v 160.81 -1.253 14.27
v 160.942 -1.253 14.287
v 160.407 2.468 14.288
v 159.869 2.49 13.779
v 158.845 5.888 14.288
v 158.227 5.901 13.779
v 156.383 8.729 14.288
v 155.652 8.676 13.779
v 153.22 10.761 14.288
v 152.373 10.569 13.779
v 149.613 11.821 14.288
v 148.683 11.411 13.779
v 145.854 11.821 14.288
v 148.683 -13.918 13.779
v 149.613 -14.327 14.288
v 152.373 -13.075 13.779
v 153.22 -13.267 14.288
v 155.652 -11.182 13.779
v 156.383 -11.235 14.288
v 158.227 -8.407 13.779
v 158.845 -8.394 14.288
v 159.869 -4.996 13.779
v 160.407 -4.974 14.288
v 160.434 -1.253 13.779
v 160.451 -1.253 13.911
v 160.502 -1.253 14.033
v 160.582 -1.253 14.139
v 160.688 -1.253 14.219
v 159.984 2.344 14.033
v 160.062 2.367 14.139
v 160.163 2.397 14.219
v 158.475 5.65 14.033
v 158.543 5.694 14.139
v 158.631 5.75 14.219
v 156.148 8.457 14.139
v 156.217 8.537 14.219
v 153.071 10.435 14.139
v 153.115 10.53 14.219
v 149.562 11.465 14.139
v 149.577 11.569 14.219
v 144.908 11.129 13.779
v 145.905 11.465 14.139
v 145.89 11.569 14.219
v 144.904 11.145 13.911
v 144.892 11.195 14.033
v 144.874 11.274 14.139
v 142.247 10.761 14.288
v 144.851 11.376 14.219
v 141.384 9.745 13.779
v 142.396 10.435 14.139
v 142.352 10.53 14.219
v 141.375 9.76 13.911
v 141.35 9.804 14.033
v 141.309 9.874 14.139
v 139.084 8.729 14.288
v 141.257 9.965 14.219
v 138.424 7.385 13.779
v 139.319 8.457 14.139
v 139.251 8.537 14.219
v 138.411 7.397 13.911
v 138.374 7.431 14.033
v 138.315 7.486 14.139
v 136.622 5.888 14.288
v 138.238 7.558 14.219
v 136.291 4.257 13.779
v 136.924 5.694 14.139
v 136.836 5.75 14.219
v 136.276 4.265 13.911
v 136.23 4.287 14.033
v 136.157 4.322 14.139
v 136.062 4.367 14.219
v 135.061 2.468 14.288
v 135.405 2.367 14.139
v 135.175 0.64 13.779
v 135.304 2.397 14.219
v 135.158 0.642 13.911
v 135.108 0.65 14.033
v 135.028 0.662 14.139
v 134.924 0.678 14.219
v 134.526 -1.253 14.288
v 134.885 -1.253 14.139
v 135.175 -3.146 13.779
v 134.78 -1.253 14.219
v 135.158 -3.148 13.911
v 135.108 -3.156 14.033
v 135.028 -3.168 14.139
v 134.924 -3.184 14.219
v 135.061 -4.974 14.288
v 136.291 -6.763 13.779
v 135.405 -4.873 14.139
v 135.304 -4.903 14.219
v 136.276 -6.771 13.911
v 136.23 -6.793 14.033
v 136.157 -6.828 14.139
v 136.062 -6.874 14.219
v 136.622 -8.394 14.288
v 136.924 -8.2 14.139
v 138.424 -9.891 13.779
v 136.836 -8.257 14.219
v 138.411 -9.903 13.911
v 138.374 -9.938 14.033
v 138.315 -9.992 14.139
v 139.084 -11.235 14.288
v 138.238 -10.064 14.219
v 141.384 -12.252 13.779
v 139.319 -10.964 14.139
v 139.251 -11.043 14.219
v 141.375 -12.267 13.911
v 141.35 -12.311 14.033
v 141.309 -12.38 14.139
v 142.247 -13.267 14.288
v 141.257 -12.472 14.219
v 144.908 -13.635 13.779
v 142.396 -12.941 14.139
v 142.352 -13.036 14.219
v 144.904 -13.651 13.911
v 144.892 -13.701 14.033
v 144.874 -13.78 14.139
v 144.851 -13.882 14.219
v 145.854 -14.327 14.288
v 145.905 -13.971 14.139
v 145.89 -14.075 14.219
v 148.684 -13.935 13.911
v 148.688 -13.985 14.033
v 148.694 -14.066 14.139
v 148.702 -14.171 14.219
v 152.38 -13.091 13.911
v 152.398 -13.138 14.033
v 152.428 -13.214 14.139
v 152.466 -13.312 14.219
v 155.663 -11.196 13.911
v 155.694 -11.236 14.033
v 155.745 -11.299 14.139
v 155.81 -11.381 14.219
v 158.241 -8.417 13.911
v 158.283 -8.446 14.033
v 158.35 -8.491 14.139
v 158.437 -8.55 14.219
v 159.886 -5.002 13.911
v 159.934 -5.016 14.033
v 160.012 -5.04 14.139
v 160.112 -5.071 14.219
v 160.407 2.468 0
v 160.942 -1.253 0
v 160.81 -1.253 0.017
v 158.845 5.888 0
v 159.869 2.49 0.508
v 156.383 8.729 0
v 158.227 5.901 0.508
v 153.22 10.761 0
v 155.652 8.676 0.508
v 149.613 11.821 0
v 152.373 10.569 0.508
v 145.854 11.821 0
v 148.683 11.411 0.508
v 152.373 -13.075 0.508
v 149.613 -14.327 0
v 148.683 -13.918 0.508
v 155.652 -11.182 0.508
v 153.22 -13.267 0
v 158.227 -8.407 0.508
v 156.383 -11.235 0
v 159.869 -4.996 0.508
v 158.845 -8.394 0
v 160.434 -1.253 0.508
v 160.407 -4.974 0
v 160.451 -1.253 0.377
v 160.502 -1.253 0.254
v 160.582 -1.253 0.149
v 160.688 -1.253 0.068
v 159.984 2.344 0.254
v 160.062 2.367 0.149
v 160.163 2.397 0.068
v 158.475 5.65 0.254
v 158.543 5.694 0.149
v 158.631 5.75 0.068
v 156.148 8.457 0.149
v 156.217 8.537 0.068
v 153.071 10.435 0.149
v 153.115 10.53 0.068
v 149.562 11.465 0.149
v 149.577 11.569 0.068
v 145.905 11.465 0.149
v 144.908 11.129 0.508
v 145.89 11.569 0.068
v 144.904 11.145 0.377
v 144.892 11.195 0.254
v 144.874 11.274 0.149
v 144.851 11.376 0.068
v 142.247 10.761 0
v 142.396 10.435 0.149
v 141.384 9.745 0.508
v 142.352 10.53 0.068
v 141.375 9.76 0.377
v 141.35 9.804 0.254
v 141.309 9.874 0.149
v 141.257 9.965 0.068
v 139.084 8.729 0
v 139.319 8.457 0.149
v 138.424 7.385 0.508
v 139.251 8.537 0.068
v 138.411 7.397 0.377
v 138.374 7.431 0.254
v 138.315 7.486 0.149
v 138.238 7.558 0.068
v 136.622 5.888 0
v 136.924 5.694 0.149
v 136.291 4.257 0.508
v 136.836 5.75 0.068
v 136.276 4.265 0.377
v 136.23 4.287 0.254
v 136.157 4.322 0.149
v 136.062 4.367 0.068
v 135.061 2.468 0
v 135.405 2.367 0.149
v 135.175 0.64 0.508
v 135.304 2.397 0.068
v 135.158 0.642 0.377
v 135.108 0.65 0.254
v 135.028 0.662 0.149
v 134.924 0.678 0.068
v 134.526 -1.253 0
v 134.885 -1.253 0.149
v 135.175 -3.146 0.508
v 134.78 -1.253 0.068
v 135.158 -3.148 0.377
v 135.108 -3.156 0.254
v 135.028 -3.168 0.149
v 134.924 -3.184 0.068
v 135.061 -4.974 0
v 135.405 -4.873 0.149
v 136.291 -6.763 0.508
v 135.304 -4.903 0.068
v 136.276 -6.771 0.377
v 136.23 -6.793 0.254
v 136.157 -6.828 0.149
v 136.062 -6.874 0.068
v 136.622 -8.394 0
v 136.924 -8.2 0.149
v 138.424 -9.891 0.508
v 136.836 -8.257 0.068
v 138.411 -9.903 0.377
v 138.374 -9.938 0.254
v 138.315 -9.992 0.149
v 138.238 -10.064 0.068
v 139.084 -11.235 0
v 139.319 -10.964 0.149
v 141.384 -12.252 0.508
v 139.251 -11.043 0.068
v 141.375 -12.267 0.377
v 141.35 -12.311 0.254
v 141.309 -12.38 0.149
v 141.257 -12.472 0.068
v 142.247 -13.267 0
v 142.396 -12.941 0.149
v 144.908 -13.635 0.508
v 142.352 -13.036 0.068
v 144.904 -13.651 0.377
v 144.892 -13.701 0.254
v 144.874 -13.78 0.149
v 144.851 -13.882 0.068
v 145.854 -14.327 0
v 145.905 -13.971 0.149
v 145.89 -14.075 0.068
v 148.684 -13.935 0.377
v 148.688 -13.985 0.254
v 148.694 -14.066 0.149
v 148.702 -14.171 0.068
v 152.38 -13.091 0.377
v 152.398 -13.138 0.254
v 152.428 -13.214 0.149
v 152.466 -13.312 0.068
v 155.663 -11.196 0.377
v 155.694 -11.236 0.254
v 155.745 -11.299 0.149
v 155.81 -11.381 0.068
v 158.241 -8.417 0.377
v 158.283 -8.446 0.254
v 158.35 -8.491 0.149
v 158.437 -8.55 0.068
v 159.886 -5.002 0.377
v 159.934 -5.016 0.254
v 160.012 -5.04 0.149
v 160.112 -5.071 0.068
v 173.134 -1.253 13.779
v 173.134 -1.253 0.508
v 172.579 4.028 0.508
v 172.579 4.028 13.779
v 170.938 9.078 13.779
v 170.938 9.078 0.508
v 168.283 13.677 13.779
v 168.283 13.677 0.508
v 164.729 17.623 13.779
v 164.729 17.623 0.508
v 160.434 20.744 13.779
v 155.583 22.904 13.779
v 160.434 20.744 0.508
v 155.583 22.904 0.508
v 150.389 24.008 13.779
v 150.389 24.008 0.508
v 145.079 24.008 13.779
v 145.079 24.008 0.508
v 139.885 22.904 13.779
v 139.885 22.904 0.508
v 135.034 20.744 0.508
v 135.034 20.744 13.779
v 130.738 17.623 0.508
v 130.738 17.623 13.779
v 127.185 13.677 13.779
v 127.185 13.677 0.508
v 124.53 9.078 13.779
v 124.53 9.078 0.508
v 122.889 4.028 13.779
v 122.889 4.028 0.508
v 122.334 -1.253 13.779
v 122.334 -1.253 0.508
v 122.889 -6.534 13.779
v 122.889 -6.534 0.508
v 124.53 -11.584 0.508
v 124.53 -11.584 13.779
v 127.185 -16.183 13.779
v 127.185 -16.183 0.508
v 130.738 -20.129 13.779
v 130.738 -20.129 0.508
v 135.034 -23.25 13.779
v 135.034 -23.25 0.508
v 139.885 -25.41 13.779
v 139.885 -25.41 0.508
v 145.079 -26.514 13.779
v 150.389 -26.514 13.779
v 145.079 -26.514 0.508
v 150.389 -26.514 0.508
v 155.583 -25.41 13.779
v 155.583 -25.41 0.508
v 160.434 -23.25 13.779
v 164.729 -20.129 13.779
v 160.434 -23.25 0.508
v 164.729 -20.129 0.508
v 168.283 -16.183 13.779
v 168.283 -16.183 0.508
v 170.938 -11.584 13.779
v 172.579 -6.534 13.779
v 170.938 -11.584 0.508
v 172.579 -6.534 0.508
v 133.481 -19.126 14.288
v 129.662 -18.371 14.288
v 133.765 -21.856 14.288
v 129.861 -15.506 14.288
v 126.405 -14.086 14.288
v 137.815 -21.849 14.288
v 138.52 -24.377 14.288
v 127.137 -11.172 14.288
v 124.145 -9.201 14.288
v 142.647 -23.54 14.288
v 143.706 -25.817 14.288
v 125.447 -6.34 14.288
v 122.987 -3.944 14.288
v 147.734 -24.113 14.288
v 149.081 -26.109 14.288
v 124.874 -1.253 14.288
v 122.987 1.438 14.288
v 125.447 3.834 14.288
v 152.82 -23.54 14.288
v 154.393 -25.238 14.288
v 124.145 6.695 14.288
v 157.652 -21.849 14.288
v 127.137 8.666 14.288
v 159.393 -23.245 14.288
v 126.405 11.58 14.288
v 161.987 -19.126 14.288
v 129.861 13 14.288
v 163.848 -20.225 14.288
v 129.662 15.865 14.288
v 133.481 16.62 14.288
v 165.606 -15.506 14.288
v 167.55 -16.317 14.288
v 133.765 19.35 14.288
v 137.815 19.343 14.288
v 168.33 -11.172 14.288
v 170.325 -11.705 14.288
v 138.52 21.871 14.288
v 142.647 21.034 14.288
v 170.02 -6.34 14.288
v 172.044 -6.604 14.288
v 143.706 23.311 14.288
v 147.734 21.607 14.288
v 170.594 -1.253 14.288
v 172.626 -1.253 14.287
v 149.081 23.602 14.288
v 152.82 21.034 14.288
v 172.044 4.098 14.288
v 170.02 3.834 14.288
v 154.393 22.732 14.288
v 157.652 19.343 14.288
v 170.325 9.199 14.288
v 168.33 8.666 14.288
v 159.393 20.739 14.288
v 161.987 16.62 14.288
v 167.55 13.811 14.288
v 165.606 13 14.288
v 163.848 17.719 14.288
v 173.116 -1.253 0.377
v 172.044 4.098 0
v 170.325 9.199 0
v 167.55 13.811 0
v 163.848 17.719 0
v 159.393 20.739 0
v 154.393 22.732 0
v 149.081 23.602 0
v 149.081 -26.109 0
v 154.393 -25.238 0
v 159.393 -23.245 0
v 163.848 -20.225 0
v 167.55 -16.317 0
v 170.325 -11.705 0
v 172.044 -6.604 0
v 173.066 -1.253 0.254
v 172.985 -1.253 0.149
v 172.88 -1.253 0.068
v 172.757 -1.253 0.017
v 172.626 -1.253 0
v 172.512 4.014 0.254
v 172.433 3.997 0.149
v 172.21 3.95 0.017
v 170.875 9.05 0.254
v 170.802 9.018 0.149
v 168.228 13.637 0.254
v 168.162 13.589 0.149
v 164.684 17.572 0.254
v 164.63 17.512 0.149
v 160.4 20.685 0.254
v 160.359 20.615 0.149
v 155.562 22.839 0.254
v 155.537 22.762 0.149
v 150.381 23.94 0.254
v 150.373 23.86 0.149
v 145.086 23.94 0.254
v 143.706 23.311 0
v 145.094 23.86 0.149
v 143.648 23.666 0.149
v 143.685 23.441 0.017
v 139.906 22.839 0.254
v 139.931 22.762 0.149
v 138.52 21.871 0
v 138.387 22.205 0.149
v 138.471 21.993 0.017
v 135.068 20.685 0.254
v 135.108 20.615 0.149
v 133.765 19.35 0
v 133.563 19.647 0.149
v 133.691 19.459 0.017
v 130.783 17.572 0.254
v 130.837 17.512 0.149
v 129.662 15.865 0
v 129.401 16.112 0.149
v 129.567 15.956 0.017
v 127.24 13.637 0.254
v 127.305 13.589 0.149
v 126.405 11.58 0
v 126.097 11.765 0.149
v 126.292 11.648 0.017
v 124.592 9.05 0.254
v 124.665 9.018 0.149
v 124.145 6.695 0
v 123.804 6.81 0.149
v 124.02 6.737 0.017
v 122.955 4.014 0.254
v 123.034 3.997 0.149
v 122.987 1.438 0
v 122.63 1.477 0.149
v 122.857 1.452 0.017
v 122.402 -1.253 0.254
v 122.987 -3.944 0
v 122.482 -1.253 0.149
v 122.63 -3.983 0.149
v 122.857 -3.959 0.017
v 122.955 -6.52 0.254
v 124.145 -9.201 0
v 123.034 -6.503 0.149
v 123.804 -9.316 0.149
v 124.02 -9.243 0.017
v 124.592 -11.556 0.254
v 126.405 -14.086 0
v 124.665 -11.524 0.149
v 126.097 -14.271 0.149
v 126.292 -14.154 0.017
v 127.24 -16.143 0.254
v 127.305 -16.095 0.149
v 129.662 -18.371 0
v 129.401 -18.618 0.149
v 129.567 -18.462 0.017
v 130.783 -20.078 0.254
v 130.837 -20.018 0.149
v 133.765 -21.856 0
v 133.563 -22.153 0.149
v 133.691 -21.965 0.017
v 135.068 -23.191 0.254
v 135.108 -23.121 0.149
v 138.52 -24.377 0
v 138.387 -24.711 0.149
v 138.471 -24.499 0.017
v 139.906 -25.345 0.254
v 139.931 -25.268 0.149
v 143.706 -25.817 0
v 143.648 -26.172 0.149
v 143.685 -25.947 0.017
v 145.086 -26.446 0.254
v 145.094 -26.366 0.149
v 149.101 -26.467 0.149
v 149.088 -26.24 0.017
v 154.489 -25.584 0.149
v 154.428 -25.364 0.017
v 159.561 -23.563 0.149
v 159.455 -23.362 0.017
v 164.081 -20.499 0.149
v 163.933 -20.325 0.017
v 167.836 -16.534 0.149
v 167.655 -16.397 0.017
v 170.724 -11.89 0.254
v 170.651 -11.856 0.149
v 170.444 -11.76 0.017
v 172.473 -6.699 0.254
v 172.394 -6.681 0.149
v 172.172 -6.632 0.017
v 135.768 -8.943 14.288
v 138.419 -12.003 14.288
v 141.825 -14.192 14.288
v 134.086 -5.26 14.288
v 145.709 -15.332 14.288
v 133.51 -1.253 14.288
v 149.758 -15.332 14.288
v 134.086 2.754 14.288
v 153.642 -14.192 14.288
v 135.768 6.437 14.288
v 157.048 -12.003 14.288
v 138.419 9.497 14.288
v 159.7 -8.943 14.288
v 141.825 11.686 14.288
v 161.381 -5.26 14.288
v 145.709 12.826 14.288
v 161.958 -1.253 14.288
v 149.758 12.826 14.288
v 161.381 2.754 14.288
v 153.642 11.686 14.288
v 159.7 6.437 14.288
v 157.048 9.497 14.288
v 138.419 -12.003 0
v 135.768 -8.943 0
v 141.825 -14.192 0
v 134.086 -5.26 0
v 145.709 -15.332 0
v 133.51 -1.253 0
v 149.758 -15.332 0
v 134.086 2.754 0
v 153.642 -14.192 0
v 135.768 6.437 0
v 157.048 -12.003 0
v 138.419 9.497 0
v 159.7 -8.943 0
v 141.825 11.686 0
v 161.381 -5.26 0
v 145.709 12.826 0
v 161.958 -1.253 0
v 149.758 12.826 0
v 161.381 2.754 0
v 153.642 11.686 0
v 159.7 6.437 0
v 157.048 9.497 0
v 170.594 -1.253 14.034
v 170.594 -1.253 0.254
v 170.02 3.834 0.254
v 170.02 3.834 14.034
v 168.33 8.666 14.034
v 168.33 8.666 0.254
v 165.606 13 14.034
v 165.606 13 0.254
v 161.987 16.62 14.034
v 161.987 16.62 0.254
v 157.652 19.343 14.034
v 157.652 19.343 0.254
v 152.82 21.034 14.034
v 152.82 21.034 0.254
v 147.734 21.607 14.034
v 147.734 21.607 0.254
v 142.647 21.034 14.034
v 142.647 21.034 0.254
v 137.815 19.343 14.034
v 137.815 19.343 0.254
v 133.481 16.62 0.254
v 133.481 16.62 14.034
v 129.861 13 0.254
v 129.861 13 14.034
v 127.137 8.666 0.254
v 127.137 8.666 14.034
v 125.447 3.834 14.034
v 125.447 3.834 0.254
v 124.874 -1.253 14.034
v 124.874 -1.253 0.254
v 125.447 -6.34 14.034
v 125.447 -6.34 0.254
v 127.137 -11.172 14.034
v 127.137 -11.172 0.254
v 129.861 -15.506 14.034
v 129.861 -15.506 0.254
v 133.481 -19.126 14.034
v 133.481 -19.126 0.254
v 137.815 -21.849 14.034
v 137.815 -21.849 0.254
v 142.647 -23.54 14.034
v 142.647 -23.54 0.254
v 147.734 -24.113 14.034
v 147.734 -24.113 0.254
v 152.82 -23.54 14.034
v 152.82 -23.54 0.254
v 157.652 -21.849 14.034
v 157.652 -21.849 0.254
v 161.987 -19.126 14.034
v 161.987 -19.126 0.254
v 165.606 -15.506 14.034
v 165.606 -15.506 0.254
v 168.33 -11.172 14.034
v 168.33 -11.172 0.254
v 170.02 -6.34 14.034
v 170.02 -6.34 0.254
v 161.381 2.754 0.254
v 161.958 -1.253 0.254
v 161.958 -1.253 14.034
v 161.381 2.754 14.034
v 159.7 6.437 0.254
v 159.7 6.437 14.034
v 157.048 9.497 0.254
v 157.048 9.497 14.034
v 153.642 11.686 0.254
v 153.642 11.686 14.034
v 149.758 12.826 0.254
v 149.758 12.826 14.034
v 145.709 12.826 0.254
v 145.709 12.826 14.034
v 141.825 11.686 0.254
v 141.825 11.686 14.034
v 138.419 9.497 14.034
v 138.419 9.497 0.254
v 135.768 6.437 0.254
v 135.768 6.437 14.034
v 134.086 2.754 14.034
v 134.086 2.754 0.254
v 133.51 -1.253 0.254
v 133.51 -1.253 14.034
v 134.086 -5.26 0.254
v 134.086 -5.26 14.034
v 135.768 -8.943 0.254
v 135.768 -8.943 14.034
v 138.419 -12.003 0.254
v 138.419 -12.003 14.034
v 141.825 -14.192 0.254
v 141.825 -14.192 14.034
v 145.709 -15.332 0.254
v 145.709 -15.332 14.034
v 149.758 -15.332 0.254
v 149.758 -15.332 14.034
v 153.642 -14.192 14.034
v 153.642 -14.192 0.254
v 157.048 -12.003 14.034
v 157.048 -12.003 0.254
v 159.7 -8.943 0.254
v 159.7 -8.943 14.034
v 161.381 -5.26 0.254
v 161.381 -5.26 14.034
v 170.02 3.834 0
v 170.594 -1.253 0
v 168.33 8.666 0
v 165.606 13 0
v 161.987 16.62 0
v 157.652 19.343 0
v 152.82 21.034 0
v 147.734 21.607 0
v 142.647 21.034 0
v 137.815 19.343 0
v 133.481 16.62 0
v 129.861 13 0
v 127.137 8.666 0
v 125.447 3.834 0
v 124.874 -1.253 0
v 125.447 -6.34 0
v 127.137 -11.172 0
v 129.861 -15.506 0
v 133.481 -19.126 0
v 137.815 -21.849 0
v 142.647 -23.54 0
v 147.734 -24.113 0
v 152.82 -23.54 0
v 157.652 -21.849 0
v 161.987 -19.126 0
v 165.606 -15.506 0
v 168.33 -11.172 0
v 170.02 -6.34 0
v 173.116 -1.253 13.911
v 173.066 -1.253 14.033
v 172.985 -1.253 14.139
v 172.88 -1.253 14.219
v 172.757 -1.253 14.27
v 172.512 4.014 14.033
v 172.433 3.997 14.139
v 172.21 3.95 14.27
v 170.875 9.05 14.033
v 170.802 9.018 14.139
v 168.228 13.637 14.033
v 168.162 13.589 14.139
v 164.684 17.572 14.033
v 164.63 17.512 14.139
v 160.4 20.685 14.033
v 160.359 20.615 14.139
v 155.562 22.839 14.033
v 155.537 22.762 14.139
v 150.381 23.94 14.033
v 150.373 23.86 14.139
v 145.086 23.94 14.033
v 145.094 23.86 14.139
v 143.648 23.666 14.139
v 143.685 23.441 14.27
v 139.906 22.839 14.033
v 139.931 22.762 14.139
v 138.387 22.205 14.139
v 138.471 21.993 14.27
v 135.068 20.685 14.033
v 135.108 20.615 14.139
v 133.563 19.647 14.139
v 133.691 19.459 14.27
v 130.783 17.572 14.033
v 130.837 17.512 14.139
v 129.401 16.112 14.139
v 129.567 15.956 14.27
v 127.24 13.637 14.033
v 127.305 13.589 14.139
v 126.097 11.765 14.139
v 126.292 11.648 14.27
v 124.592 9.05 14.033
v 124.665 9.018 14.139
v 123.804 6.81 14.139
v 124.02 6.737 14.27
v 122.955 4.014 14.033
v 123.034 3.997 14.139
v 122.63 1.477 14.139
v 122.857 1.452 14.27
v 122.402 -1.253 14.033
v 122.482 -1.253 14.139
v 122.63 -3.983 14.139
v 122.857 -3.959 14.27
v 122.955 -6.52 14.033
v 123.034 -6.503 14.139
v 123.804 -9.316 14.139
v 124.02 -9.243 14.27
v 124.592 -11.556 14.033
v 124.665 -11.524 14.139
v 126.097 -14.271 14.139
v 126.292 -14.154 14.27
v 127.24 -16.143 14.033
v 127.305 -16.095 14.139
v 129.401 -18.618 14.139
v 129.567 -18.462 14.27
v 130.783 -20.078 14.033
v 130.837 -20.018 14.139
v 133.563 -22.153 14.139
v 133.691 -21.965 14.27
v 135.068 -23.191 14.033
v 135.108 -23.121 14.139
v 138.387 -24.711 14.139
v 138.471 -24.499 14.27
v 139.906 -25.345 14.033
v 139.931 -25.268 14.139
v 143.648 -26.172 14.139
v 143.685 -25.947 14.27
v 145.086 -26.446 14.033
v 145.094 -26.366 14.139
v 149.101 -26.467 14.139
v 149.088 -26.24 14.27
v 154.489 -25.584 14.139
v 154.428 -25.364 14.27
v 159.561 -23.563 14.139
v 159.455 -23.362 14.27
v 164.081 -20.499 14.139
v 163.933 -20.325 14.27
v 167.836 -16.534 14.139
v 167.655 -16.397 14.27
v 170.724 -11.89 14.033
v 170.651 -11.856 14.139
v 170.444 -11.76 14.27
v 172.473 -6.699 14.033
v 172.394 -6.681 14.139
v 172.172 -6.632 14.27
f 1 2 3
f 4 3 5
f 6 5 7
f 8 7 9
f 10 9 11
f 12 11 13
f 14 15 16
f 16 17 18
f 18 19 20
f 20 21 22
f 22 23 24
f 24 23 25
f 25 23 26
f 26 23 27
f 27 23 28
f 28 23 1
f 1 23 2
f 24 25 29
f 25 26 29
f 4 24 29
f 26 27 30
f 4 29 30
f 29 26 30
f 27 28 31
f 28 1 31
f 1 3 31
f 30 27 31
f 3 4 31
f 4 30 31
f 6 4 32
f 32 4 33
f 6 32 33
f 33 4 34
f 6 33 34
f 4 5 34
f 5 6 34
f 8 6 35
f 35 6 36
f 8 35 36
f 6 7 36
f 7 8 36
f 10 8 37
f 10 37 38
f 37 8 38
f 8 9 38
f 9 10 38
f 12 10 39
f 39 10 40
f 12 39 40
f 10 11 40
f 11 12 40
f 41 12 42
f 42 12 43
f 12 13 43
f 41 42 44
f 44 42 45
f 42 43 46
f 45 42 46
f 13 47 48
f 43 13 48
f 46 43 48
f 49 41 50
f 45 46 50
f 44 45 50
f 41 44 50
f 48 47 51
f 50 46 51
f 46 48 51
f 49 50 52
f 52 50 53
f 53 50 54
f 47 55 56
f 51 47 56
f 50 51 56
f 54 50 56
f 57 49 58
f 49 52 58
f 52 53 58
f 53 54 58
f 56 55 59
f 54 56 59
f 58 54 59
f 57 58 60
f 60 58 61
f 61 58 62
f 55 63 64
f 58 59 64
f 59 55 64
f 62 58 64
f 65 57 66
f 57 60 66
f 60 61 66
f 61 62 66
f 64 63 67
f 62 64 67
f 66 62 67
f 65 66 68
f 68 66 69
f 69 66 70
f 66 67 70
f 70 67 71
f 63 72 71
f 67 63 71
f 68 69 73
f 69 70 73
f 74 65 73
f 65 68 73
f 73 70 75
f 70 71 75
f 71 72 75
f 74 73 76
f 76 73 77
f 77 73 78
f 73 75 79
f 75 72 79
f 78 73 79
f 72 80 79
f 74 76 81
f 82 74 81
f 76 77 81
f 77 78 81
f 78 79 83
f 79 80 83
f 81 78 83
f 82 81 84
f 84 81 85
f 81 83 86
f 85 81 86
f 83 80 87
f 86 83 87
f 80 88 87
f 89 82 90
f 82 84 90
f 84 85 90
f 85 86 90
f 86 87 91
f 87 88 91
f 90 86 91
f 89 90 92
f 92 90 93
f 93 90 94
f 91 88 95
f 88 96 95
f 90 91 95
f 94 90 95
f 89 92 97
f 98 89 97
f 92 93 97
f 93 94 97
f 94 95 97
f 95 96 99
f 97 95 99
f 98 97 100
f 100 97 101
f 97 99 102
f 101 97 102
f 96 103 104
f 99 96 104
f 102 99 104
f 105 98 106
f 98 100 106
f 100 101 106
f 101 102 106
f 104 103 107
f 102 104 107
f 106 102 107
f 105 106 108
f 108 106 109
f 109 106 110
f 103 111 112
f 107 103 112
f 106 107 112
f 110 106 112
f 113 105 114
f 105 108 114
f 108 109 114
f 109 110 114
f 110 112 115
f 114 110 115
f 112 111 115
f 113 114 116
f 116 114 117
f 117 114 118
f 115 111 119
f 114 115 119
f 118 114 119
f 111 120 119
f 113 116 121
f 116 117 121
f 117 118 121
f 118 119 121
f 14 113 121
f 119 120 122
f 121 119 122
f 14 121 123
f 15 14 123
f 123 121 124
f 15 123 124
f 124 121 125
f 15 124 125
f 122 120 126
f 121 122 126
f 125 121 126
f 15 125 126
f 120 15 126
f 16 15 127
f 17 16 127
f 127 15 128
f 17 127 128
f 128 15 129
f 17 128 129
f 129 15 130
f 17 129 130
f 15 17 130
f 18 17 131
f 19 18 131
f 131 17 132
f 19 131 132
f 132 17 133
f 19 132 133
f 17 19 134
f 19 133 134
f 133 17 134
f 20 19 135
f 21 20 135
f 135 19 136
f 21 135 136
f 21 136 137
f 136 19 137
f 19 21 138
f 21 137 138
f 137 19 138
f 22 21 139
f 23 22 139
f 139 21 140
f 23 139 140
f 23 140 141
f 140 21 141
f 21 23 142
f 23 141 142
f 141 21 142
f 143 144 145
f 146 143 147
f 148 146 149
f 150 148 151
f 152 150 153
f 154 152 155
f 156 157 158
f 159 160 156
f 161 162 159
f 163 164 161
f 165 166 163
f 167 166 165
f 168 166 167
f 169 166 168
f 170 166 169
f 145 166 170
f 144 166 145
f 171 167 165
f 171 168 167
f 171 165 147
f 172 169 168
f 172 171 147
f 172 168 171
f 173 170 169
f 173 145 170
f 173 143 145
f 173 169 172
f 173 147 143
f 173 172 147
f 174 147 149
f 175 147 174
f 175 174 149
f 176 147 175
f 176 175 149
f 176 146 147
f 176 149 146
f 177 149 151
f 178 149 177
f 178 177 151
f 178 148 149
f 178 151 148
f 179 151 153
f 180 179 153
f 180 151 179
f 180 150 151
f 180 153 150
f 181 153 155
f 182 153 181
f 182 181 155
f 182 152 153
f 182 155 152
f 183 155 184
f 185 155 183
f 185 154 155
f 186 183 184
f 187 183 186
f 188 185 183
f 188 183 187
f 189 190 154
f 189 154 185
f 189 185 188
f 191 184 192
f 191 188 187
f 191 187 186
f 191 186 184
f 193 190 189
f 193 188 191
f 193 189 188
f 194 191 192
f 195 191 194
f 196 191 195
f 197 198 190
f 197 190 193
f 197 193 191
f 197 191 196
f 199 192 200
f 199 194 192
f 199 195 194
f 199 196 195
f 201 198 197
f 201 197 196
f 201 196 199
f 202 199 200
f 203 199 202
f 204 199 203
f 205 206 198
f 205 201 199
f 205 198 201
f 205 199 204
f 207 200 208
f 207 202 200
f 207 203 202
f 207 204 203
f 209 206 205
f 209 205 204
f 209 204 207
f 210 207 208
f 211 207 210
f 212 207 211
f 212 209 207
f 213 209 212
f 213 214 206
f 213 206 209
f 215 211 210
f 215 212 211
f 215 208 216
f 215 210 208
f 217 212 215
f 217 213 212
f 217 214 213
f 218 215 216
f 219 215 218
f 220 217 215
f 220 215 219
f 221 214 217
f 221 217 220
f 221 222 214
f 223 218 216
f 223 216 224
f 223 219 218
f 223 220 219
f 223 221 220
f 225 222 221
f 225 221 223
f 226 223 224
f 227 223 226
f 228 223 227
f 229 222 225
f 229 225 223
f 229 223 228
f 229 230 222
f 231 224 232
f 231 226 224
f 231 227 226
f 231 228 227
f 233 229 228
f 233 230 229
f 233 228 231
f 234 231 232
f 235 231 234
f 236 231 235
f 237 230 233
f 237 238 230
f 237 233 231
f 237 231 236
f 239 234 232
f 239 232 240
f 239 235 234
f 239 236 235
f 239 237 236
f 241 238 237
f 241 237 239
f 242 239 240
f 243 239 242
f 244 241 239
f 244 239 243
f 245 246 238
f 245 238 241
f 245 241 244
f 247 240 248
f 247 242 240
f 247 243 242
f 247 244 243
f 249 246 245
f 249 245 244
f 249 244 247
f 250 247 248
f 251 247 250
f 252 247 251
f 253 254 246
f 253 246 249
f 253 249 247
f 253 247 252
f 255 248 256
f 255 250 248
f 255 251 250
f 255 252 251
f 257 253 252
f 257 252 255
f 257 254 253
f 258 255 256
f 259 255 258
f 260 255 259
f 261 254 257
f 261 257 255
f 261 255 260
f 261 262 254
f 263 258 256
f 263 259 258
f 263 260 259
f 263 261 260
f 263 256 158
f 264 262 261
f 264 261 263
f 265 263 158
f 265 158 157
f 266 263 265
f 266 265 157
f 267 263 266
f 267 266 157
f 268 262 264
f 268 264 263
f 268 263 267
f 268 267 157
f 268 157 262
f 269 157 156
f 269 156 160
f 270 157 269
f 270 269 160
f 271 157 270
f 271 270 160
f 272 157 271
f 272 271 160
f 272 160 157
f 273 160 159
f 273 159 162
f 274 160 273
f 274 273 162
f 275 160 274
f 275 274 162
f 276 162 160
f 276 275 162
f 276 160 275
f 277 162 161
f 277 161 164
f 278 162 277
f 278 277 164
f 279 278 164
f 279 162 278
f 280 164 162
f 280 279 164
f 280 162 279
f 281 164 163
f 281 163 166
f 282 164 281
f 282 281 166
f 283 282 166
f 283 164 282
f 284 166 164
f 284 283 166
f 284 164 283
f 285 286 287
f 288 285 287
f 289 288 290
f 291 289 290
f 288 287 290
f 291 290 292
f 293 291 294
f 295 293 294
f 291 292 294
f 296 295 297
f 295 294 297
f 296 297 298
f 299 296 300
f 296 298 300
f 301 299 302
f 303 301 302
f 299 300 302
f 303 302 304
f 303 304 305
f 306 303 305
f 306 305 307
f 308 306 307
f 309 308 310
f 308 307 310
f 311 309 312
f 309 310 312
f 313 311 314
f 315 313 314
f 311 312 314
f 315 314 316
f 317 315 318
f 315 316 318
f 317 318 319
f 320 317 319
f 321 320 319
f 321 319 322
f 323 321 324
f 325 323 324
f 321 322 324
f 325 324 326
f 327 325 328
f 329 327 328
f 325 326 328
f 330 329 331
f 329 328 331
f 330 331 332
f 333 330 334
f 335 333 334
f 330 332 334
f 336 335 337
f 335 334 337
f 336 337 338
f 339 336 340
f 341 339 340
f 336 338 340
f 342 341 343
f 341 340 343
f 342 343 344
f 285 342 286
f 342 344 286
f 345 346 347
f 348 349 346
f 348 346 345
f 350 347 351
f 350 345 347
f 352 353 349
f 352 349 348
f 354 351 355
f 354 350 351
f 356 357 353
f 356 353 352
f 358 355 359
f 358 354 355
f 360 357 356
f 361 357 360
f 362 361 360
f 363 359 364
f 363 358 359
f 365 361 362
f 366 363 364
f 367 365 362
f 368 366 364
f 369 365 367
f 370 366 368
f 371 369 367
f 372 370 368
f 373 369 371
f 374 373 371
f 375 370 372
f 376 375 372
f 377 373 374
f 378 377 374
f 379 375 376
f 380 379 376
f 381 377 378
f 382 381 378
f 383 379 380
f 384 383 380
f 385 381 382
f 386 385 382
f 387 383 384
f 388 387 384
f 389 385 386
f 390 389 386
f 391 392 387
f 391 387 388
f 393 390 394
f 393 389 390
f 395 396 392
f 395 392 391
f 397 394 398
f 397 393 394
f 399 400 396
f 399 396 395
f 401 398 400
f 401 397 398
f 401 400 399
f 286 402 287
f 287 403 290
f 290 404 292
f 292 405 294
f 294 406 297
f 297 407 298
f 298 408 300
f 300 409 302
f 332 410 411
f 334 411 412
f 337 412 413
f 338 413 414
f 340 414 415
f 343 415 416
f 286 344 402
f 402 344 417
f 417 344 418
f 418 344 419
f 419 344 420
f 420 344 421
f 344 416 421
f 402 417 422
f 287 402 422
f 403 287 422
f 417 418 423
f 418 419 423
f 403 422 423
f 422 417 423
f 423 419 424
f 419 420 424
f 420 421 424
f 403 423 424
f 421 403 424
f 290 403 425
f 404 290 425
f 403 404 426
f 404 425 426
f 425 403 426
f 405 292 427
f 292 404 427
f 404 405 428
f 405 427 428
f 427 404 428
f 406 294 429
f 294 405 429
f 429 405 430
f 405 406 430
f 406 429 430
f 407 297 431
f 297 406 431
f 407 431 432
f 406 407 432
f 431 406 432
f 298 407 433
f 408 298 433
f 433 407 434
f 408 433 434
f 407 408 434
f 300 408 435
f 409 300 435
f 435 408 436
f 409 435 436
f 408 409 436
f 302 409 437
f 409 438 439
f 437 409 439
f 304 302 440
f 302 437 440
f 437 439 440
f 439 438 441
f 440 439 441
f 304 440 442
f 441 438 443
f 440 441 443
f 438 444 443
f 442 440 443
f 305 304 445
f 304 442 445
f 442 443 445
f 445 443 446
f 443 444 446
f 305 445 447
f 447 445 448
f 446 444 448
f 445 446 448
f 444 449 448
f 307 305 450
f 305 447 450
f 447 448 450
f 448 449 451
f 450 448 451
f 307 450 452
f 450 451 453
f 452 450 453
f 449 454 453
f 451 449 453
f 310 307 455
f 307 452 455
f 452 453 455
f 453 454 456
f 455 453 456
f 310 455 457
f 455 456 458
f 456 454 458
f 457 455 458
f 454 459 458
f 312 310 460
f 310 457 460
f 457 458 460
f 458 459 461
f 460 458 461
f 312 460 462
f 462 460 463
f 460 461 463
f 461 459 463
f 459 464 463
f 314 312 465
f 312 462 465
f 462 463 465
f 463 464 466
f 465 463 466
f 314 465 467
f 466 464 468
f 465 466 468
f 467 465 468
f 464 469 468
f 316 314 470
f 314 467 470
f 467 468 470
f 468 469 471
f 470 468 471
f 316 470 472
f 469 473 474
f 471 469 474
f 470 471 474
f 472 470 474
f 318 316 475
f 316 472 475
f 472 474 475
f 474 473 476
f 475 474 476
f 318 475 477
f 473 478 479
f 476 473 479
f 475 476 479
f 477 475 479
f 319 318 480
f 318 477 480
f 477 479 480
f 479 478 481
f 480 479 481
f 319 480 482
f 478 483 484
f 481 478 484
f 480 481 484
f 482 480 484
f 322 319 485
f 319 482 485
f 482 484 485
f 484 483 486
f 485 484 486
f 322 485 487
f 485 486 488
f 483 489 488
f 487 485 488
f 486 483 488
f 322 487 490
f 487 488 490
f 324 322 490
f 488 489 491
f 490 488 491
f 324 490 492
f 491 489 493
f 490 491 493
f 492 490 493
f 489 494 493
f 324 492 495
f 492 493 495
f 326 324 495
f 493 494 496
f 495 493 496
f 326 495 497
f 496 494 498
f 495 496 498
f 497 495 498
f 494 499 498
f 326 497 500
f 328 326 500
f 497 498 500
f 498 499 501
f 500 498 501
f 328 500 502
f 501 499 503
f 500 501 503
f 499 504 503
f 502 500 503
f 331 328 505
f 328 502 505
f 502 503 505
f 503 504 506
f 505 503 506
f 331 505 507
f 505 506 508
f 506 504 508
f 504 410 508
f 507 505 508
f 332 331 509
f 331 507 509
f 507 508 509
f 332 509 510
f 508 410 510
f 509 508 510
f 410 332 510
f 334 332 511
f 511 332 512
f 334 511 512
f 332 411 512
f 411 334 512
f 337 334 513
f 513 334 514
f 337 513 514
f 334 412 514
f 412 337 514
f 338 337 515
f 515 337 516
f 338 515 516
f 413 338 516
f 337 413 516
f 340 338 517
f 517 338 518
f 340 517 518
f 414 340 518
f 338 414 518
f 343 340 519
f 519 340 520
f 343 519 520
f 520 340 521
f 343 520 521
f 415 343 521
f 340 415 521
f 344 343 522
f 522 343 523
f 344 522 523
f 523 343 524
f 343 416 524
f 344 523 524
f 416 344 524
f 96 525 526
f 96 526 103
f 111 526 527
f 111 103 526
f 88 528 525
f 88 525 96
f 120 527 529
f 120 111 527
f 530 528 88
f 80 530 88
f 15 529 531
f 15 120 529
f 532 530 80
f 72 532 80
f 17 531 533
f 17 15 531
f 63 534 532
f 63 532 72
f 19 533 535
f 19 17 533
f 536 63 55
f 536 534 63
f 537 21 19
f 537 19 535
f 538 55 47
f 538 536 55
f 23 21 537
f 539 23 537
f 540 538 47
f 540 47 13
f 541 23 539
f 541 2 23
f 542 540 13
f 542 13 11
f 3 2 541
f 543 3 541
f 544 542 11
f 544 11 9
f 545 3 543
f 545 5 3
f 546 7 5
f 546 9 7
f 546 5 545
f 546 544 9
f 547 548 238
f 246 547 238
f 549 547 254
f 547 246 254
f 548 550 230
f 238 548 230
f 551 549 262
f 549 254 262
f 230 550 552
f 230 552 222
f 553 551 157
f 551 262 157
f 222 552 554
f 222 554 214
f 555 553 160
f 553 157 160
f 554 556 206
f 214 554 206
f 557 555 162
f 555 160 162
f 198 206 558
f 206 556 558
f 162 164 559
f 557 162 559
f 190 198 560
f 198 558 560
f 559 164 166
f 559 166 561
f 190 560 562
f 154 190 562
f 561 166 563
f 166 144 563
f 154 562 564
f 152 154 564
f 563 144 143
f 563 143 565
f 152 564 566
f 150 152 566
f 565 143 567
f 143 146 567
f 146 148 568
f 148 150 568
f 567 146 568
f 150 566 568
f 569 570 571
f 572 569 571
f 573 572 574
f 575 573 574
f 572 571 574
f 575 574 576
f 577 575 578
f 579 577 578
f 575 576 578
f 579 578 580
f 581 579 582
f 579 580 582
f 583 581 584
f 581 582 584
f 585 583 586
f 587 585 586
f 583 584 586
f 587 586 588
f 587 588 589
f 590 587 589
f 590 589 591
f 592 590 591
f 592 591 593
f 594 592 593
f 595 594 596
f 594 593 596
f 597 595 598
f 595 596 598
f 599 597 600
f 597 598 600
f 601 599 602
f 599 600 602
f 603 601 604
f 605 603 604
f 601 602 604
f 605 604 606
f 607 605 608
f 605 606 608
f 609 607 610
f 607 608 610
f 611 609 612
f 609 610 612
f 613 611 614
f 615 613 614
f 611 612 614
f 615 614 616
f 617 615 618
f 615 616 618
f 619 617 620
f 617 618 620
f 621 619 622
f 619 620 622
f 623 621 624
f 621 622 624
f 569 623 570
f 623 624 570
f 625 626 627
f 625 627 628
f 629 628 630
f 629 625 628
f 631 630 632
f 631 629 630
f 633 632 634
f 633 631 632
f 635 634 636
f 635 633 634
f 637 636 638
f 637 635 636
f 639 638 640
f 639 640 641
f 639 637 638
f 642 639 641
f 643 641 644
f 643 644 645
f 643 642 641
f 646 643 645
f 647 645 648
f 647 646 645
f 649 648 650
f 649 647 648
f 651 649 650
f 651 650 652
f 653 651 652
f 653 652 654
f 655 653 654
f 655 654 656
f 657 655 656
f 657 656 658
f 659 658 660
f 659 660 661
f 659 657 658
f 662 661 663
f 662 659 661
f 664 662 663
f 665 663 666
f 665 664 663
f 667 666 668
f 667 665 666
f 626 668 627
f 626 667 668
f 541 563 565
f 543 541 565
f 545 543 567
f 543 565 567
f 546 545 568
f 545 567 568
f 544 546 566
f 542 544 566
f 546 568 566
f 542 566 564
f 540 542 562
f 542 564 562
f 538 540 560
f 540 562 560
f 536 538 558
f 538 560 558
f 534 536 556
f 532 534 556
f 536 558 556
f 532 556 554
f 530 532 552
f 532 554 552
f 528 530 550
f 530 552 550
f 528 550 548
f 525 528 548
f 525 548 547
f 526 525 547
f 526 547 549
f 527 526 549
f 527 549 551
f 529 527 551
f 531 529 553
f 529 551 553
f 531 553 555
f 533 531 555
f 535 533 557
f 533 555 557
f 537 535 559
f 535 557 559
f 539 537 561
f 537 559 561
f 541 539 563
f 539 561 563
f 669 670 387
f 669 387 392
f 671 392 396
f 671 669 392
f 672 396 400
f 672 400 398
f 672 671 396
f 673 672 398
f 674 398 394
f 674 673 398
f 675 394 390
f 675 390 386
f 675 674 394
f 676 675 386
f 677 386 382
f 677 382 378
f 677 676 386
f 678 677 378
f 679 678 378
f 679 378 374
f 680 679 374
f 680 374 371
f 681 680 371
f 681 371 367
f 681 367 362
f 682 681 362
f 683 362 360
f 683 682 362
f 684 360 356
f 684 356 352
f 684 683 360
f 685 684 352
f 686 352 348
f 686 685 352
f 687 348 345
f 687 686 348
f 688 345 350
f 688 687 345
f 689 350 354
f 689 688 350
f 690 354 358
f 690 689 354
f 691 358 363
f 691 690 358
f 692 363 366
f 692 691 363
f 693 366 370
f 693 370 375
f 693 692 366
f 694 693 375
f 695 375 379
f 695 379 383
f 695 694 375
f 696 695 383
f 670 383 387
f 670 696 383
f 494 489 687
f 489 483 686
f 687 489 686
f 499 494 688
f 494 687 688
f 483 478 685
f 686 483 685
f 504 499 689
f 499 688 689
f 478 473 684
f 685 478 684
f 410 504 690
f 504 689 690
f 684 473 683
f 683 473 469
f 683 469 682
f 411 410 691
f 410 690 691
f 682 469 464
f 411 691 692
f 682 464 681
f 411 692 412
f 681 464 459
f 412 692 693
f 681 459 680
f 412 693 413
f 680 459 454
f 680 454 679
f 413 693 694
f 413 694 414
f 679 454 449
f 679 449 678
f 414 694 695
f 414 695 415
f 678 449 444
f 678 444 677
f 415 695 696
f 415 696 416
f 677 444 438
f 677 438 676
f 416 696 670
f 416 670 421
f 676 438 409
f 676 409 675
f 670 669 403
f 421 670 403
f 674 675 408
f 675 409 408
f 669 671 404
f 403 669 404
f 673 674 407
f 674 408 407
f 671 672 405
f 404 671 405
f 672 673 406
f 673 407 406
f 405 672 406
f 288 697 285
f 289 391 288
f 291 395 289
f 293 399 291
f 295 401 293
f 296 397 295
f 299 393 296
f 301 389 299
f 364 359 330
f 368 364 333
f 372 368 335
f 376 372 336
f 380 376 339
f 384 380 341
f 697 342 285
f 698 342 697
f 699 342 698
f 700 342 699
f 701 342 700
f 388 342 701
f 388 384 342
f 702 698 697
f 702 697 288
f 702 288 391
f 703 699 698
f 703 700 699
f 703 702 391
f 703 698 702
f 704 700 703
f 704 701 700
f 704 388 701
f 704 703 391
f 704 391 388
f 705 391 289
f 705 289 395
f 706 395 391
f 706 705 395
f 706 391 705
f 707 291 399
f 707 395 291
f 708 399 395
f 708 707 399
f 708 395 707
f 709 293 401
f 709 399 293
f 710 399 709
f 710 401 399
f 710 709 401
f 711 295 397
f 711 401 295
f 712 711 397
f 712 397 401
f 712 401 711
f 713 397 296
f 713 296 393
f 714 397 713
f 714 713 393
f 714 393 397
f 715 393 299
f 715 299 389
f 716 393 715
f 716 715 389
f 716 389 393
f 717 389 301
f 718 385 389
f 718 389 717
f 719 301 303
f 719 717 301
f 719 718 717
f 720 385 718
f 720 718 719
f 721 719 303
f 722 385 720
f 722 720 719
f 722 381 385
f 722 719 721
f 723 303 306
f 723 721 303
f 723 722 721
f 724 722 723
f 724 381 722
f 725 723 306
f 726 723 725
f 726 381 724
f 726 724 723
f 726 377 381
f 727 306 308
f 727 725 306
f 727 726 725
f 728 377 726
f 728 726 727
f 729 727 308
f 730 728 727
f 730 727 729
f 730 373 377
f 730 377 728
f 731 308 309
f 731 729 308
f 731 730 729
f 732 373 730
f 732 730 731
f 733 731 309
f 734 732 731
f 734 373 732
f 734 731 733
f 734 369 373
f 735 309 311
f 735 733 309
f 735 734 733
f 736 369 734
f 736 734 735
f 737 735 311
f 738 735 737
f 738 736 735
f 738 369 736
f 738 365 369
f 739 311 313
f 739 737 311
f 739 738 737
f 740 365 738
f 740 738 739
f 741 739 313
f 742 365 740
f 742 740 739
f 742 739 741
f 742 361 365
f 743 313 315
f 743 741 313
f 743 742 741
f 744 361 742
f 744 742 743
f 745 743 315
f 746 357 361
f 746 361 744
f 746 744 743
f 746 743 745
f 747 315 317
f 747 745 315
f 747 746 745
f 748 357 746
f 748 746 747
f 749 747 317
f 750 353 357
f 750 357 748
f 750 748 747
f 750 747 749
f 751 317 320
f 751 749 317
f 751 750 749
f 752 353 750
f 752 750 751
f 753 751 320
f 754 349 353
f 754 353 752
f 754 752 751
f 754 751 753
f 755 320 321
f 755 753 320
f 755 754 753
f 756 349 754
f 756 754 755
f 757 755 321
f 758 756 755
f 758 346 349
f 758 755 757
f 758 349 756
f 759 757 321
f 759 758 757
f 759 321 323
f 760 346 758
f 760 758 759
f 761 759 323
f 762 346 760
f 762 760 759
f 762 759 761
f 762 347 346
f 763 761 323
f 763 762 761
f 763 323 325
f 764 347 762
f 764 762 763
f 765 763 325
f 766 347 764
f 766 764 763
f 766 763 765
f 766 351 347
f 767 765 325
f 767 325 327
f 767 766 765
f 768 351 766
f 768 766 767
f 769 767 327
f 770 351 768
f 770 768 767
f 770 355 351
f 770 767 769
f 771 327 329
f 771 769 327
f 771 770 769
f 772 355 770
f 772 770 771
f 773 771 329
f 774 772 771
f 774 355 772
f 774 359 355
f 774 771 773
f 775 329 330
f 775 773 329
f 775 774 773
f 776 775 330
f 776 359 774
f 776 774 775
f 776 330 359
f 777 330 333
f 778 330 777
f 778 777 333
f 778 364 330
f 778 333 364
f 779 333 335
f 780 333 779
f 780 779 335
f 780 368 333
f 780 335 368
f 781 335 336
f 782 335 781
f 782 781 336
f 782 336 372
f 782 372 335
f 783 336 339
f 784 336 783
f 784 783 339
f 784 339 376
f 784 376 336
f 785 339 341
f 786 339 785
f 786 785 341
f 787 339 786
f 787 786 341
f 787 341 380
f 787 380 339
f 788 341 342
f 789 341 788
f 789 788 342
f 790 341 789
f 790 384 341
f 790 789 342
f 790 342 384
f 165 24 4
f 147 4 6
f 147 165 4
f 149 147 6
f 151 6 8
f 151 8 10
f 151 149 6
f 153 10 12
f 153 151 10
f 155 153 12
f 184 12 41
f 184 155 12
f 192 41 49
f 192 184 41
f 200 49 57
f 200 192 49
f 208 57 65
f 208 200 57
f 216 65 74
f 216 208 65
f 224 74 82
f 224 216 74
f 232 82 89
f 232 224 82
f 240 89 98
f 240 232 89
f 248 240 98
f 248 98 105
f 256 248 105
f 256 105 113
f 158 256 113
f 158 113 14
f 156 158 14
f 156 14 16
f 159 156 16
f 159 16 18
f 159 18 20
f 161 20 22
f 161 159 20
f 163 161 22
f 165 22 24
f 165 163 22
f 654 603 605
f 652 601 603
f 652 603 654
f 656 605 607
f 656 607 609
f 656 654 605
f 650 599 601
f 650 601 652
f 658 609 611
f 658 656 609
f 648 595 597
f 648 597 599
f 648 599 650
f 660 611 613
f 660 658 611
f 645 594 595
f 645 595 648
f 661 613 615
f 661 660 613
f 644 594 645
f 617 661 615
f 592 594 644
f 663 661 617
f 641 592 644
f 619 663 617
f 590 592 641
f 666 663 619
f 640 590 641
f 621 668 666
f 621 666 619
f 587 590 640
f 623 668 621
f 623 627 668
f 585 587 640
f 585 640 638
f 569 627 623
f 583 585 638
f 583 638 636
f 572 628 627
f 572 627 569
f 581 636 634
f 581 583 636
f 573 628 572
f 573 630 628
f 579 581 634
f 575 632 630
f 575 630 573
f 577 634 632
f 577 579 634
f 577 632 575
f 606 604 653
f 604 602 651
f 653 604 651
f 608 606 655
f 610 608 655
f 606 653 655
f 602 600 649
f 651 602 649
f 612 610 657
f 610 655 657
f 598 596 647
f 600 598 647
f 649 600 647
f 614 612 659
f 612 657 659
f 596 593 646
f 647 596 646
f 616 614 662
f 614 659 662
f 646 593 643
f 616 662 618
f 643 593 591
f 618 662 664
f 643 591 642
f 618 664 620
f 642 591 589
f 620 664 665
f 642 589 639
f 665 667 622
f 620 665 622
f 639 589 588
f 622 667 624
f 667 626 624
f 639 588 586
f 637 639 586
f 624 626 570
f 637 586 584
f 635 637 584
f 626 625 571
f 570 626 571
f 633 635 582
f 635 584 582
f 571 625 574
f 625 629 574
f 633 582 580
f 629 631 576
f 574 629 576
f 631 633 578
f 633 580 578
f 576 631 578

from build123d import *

# Parameters (mm, degrees)
SKETCH3_R             = 14.224
SKETCH3_R_2           = 12.7
BOSS_EXTRUDE1_DEPTH   = 14.2875
SKETCH3_R_3           = 25.4
SKETCH3_R_4           = 22.86
BOSS_EXTRUDE1_2_DEPTH = 14.2875
BOSS_EXTRUDE2_START   = 0.254
SKETCH3_3_R           = 22.86
SKETCH3_3_R_2         = 14.224
BOSS_EXTRUDE2_DEPTH   = 13.7795
FILLET1_R             = 0.508
FILLET2_R             = 0.508


with BuildPart() as part:
    # Sketch3 → Boss-Extrude1 (new body)
    with BuildSketch(Plane.XY):
        with Locations((147.733573081, -1.253039706)):
            Circle(SKETCH3_R)
        with Locations((147.733573081, -1.253039706)):
            Circle(SKETCH3_R_2, mode=Mode.SUBTRACT)
    extrude(amount=BOSS_EXTRUDE1_DEPTH)

    # Fillet1
    fillet1_edges = [part.edges().sort_by_distance(p)[0] for p in [
        (135.033573081, -1.253039706, 14.2875),
        (135.033573081, -1.253039706, 0),
    ]]
    fillet(fillet1_edges, radius=FILLET1_R)


with BuildPart() as body_2:
    # Sketch3 → Boss-Extrude1 2 (new body)
    with BuildSketch(Plane.XY):
        with Locations((147.733573081, -1.253039706)):
            Circle(SKETCH3_R_3)
        with Locations((147.733573081, -1.253039706)):
            Circle(SKETCH3_R_4, mode=Mode.SUBTRACT)
    extrude(amount=BOSS_EXTRUDE1_2_DEPTH)

    # Fillet2
    fillet2_edges = [body_2.edges().sort_by_distance(p)[0] for p in [
        (122.333573081, -1.253039706, 14.2875),
        (122.333573081, -1.253039706, 0),
    ]]
    fillet(fillet2_edges, radius=FILLET2_R)


with BuildPart() as body_3:
    # Sketch3<3> → Boss-Extrude2 (new body)
    with BuildSketch(Plane.XY.offset(BOSS_EXTRUDE2_START)):
        with Locations((147.733573081, -1.253039706)):
            Circle(SKETCH3_3_R)
        with Locations((147.733573081, -1.253039706)):
            Circle(SKETCH3_3_R_2, mode=Mode.SUBTRACT)
    extrude(amount=BOSS_EXTRUDE2_DEPTH)


solid = Compound([part.part, body_2.part, body_3.part])
